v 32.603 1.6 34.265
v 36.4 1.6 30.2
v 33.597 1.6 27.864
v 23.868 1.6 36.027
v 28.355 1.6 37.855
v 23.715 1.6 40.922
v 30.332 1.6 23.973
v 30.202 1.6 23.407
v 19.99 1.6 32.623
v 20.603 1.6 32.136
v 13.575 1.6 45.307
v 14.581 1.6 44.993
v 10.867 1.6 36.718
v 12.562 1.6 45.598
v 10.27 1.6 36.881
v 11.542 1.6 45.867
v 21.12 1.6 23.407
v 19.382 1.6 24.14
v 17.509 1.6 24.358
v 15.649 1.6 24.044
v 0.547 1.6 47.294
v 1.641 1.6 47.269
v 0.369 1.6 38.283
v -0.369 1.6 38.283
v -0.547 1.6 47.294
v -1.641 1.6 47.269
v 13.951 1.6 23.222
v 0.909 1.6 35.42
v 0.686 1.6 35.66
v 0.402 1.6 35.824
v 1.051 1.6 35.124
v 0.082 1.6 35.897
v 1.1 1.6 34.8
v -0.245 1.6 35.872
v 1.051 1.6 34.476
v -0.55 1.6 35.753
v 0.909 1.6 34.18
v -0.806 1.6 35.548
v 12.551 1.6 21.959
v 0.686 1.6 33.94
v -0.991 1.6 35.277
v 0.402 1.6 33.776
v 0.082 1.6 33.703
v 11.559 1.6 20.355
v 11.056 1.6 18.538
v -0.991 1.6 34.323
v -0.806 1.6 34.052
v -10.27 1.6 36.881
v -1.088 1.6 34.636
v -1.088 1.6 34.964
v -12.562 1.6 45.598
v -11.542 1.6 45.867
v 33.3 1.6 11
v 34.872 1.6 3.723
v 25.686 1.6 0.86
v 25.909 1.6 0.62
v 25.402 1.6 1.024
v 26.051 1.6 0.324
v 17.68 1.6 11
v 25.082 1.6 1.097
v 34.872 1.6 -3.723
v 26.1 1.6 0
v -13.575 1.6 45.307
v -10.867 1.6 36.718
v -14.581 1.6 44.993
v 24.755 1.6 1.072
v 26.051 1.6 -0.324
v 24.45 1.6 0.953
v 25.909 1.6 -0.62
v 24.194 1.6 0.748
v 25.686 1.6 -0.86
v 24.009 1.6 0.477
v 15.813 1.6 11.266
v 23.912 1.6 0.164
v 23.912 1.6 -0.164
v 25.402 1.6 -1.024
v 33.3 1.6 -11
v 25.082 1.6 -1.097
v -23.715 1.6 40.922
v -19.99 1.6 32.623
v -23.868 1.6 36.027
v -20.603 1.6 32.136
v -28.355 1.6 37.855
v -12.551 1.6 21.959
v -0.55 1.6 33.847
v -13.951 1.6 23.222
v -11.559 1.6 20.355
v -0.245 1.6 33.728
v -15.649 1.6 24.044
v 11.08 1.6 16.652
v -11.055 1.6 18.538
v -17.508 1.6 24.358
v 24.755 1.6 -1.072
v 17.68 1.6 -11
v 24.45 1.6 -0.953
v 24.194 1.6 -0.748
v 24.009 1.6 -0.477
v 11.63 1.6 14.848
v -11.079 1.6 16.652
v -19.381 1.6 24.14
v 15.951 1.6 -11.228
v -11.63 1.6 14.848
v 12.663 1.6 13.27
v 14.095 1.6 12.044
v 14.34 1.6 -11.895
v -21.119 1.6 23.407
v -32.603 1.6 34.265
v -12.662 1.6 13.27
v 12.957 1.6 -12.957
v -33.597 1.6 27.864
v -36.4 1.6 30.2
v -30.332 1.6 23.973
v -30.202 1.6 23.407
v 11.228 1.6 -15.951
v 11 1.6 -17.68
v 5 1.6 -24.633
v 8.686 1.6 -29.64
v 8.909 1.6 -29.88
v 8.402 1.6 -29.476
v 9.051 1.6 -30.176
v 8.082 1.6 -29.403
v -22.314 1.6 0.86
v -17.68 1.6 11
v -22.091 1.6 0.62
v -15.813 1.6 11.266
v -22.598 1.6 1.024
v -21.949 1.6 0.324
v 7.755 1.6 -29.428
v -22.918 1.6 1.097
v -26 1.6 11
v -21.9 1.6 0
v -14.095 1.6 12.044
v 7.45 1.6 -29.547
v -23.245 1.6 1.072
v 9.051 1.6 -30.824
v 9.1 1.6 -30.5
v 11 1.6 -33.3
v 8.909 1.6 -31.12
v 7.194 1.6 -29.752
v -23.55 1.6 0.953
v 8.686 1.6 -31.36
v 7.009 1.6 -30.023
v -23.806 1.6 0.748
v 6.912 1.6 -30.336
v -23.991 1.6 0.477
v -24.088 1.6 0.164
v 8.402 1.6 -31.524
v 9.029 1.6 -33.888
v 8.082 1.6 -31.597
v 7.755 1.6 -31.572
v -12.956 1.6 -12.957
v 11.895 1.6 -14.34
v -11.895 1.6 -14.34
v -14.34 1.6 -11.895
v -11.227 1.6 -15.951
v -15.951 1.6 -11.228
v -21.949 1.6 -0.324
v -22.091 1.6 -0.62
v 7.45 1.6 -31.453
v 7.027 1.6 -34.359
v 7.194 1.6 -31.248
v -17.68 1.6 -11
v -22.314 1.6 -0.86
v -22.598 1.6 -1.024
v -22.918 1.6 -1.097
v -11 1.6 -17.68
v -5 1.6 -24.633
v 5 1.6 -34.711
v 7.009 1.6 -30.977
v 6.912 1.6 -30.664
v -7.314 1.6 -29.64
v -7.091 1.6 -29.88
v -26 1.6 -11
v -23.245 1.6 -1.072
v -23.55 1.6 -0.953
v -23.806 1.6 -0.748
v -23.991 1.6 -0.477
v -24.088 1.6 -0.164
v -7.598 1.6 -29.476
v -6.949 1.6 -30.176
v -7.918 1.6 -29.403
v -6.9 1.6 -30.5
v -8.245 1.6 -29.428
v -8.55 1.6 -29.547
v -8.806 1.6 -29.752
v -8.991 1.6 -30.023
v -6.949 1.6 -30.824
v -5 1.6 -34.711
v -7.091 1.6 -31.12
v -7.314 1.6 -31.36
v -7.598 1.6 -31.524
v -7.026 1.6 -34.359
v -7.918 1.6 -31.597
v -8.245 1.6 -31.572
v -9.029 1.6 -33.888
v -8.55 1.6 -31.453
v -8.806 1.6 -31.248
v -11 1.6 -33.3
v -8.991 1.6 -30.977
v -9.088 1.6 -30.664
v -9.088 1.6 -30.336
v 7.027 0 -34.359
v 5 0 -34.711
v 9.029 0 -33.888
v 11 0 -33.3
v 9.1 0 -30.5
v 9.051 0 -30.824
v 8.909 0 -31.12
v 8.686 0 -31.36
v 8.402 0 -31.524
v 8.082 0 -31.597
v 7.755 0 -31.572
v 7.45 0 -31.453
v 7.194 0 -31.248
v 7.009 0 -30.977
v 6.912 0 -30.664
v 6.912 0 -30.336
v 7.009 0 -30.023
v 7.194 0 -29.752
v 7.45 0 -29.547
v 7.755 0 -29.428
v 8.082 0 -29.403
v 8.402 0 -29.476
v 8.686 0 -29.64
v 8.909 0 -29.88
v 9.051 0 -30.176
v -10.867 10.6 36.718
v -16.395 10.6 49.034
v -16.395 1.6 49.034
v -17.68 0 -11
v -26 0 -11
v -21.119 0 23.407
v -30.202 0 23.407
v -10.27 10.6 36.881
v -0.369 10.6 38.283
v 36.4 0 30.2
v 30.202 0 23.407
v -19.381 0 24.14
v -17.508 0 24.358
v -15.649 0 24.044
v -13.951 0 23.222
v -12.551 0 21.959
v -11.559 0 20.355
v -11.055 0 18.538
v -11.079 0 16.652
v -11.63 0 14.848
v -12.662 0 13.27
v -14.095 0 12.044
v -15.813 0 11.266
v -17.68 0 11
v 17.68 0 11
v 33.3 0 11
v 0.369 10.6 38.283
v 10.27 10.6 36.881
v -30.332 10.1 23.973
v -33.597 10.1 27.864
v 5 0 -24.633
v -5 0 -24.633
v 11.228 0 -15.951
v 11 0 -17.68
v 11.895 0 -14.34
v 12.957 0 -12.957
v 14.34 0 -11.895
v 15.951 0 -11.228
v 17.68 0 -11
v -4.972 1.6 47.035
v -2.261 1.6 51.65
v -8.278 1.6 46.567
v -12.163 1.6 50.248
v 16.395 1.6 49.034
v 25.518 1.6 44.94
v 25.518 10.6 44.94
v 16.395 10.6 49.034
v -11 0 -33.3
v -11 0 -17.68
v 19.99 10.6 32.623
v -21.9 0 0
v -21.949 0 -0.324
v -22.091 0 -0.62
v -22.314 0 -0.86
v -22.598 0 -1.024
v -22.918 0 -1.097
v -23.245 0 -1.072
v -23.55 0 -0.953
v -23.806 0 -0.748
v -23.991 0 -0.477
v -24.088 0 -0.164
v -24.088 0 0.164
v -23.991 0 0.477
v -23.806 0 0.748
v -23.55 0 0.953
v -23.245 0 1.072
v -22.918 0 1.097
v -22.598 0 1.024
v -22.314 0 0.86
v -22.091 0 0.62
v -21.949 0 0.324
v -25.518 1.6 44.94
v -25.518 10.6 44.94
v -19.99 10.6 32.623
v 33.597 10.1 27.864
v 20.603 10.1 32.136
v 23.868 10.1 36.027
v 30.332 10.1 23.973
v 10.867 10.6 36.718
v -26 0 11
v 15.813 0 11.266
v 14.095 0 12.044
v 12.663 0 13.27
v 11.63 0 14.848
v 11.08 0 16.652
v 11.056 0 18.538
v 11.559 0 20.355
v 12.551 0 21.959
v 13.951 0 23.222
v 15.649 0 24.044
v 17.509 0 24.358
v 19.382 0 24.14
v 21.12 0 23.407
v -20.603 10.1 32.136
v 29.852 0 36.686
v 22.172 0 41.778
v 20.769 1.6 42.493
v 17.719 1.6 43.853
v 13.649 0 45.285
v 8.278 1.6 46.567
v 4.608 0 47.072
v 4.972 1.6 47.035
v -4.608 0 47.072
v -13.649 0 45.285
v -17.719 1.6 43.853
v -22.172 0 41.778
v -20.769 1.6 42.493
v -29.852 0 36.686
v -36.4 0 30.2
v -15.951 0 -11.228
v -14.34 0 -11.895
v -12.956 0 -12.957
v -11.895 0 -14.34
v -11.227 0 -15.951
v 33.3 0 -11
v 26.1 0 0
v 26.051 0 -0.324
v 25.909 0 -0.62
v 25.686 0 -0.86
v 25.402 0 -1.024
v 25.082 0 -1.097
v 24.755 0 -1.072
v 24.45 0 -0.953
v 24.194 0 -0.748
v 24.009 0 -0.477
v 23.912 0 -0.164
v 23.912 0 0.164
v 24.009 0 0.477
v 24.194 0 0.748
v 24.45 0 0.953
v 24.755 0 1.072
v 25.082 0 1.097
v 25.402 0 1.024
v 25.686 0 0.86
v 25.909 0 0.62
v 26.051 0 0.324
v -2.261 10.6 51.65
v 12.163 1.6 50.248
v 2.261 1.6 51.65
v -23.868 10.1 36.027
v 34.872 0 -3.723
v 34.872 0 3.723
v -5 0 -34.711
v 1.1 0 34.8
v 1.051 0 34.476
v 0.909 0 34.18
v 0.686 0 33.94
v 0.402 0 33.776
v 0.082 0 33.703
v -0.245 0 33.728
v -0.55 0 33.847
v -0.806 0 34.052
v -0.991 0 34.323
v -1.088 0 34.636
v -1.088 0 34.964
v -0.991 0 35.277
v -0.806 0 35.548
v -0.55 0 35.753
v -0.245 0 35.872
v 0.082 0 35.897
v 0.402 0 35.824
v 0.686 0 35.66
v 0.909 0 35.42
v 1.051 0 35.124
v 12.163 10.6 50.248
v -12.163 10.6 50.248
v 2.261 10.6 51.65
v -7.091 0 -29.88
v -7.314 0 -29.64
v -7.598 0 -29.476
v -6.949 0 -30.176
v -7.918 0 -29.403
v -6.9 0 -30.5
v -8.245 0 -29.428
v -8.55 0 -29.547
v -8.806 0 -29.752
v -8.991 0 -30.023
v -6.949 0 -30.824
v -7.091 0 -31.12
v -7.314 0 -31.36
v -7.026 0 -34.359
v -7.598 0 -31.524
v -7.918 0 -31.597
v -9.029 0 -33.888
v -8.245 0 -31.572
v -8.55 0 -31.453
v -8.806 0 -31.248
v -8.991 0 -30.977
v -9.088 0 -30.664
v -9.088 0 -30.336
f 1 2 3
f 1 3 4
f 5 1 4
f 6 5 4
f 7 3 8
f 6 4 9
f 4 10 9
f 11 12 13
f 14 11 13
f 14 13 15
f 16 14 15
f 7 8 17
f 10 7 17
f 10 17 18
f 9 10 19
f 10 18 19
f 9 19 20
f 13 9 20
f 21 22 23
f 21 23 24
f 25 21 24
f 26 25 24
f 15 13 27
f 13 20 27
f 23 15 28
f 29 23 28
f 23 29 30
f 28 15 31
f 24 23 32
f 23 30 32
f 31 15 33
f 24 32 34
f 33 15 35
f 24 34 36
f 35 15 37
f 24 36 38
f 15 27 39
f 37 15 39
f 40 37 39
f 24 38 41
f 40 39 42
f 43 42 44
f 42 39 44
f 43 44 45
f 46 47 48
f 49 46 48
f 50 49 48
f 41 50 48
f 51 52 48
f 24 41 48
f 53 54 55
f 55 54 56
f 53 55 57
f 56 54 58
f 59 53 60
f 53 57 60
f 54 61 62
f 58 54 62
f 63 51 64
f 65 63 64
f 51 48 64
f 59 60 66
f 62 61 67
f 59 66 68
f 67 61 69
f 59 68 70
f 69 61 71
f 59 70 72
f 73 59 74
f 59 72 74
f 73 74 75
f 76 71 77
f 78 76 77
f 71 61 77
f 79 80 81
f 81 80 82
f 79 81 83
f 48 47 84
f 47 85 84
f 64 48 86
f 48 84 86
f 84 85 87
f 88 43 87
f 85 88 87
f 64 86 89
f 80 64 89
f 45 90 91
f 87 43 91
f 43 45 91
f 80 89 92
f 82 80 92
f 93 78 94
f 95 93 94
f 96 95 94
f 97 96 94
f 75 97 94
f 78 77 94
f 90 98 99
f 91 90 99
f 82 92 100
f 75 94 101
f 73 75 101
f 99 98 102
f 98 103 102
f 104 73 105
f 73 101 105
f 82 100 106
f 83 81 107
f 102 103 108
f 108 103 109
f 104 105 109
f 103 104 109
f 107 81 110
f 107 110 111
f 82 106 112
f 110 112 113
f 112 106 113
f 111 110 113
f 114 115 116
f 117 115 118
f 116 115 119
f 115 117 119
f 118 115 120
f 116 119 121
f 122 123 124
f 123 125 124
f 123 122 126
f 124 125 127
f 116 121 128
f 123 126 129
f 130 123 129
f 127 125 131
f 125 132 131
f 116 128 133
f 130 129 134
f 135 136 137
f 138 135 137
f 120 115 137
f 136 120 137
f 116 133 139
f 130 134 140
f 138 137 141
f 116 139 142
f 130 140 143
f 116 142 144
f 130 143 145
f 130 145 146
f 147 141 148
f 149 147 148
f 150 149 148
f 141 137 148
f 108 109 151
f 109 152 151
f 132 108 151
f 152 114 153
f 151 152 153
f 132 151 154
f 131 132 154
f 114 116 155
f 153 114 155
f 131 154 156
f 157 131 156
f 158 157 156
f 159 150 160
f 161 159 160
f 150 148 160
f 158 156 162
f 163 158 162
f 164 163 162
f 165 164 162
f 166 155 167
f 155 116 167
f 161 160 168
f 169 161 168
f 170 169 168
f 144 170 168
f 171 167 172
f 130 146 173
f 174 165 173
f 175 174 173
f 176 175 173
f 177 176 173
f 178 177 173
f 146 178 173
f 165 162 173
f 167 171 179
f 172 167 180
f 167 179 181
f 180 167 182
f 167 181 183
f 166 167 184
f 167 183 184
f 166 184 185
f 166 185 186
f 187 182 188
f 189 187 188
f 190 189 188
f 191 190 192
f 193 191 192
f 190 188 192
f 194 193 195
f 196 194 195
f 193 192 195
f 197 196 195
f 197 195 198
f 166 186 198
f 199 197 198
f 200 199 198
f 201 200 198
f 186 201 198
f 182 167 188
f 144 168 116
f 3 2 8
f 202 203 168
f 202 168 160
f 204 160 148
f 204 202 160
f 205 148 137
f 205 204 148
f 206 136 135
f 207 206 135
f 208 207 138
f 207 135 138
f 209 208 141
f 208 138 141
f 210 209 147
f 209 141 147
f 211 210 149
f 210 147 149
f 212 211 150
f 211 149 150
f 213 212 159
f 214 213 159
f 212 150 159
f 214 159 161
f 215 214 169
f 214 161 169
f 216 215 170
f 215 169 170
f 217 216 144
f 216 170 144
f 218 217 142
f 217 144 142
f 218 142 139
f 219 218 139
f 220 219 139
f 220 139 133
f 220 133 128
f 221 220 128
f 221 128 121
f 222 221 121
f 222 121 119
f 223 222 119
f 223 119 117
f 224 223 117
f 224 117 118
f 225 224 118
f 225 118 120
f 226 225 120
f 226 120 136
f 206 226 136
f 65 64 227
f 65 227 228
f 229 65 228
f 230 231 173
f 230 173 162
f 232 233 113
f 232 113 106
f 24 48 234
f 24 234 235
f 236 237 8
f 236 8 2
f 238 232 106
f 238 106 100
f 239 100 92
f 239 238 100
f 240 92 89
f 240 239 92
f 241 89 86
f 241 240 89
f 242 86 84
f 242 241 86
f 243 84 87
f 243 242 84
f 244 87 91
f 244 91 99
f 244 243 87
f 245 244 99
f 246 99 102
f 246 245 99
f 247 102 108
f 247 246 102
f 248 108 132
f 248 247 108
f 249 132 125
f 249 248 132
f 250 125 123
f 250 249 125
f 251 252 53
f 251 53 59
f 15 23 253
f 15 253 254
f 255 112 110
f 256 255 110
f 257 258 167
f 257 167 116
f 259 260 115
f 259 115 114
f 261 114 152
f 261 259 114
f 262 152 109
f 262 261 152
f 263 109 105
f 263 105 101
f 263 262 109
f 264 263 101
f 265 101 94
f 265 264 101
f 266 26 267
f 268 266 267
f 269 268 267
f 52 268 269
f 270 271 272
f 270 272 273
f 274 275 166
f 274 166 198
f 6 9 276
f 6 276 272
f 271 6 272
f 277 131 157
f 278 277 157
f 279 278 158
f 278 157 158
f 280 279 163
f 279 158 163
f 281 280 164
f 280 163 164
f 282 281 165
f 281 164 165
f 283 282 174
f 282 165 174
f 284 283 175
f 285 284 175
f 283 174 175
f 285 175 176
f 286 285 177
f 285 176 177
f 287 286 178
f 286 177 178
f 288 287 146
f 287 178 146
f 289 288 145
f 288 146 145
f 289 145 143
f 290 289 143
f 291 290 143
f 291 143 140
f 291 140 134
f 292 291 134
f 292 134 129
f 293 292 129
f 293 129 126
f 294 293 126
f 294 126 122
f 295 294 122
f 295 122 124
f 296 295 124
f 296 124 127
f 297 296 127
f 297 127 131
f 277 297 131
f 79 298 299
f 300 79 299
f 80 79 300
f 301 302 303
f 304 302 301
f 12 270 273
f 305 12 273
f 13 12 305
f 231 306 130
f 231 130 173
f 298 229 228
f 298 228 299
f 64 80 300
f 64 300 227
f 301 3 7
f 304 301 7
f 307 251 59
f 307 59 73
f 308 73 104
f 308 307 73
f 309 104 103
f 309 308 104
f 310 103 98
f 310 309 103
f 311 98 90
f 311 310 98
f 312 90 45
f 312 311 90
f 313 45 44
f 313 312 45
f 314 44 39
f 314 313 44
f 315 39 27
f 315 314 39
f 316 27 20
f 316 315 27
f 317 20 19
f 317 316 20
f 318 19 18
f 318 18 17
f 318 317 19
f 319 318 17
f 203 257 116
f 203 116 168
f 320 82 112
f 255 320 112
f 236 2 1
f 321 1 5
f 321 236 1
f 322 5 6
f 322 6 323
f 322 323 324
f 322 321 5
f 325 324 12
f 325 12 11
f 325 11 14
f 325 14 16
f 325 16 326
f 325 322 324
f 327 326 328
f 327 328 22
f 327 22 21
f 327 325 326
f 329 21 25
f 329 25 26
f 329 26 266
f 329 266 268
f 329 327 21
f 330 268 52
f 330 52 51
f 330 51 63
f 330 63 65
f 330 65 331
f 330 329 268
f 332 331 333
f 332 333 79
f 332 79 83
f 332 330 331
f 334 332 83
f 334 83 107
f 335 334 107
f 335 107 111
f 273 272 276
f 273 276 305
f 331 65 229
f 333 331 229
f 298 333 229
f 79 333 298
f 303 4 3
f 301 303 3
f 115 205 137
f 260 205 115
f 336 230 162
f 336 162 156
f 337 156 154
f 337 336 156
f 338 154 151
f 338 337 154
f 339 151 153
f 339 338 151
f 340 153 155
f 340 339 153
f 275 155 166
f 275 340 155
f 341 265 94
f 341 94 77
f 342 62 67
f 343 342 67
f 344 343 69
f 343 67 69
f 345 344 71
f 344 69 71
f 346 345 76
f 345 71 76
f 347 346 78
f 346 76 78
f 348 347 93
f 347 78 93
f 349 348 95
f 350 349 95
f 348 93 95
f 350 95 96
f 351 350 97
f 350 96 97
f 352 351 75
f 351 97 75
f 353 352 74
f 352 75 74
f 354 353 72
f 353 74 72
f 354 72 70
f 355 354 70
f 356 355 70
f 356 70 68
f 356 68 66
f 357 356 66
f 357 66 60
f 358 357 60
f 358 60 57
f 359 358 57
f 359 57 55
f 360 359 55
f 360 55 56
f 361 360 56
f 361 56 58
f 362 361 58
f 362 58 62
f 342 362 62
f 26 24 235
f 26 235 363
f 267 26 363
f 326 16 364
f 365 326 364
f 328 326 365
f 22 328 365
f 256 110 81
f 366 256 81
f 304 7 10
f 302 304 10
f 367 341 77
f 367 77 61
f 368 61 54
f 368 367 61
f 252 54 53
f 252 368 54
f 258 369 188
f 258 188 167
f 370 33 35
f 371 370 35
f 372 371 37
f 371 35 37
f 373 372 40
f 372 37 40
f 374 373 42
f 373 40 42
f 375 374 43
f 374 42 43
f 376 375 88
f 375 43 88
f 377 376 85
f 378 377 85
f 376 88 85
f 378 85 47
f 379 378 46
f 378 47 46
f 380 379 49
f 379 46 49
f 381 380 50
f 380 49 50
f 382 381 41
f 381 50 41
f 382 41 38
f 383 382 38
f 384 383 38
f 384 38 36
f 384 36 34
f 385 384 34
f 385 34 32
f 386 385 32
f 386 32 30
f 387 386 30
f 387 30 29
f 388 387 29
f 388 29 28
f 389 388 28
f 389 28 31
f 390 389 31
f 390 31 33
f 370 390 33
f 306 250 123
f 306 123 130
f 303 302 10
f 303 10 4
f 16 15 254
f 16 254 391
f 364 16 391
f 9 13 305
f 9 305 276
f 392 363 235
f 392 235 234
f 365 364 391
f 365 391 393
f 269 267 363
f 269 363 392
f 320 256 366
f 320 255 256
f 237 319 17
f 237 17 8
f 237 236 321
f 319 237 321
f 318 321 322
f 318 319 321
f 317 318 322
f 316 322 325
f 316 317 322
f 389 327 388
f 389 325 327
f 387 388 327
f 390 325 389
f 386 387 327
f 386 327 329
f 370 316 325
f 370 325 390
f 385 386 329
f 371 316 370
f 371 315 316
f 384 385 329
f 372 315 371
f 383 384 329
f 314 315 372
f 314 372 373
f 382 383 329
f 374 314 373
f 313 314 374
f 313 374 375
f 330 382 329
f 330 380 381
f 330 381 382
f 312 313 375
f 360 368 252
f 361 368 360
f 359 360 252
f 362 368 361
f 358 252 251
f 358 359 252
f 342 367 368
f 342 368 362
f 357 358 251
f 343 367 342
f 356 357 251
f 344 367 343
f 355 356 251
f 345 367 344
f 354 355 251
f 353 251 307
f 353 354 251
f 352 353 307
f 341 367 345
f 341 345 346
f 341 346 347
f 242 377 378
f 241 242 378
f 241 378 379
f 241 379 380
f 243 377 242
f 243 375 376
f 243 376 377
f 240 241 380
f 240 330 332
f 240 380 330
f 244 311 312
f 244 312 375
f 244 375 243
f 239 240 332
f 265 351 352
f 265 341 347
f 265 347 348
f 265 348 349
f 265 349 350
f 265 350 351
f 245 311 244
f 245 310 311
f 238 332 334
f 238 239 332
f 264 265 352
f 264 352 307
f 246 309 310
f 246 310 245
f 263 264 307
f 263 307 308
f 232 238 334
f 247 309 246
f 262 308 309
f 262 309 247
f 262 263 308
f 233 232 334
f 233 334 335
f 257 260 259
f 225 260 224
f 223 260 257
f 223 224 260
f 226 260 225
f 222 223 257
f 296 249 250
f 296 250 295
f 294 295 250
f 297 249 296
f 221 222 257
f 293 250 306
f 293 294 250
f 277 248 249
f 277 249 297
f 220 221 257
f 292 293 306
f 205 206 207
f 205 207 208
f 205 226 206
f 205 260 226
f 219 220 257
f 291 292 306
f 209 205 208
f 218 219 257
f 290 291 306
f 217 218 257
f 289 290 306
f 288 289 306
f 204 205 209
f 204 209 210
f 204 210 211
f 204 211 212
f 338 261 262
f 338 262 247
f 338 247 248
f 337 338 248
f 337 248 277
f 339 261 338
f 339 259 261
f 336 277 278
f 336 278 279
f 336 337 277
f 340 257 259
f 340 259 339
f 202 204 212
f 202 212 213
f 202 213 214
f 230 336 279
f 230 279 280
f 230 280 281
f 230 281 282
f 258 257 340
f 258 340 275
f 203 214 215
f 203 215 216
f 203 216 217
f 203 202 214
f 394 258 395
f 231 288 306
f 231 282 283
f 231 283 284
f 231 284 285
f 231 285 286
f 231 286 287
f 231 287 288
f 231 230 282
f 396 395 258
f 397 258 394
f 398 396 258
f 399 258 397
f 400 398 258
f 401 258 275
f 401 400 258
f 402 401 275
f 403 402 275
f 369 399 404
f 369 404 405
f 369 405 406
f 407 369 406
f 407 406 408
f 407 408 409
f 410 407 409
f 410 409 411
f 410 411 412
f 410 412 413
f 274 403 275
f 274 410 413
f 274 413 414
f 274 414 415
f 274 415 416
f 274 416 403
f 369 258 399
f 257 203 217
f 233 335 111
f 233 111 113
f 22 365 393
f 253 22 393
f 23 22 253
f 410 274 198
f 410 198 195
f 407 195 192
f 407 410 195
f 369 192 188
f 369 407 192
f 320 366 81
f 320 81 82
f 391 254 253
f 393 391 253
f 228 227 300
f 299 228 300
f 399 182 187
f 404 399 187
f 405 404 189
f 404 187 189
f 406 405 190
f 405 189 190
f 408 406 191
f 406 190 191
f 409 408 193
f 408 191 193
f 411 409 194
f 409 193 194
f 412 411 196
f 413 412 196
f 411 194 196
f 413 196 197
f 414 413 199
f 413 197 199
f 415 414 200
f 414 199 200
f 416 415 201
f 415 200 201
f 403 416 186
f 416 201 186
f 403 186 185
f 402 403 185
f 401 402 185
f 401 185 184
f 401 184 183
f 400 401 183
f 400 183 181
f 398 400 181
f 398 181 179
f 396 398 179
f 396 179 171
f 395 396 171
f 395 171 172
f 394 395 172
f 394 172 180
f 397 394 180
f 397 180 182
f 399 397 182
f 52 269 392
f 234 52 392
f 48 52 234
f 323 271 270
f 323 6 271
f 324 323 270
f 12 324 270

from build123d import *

# Parameters (mm, degrees)
BOSS_EXTRUDE1_DEPTH = 1.6
BOSS_EXTRUDE2_DEPTH = 8.5
BOSS_EXTRUDE3_DEPTH = 9
SKETCH4_R           = 1.1
CUT_EXTRUDE1_DEPTH  = 2.6


with BuildPart() as part:
    # Sketch1 → Boss-Extrude1 (new body)
    with BuildSketch(Plane(origin=(0, 0, 0), x_dir=(1, 0, 0), z_dir=(0, 1, 0))):
        with BuildLine():
            Line((-10.999776277, 17.68), (-10.999776277, 33.3))
            ThreePointArc((-10.999776277, 33.3), (-8.030956433, 34.137791623), (-5, 34.711454567))
            Line((-5, 34.711454567), (-5, 24.633454567))
            Line((-5, 24.633454567), (5, 24.633454567))
            Line((5, 24.633454567), (5, 34.711454567))
            ThreePointArc((5, 34.711454567), (8.031185785, 34.137737667), (11.000223723, 33.299852195))
            Line((11.000223723, 33.299852195), (11.000223723, 17.68))
            ThreePointArc((11.000223723, 17.68), (12.956750425, 12.956526702), (17.680223723, 11))
            Line((17.680223723, 11), (33.300223723, 11))
            ThreePointArc((33.300223723, 11), (35.07, 0), (33.300223723, -11))
            Line((33.300223723, -11), (17.680223723, -11))
            ThreePointArc((17.680223723, -11), (11.24298933, -19.464492467), (21.119504048, -23.406582825))
            Line((21.119504048, -23.406582825), (30.202056601, -23.406582825))
            Line((30.202056601, -23.406582825), (36.4, -30.200102798))
            ThreePointArc((36.4, -30.200102798), (0, -47.297), (-36.4, -30.200102798))
            Line((-36.4, -30.200102798), (-30.202056601, -23.406582825))
            Line((-30.202056601, -23.406582825), (-21.119056601, -23.406582825))
            ThreePointArc((-21.119056601, -23.406582825), (-11.242541883, -19.464492467), (-17.679776277, -11))
            Line((-17.679776277, -11), (-25.999776277, -11))
            Line((-25.999776277, -11), (-25.999776277, 11))
            Line((-25.999776277, 11), (-17.679776277, 11))
            ThreePointArc((-17.679776277, 11), (-12.956302978, 12.956526702), (-10.999776277, 17.68))
        make_face()
    extrude(amount=BOSS_EXTRUDE1_DEPTH)

    # Sketch2 → Boss-Extrude2 (add)
    with BuildSketch(Plane(origin=(0, 1.6, 0), x_dir=(1, 0, 0), z_dir=(0, 1, 0))):
        Polygon((-33.597062742, -27.864051564), (-23.868298315, -36.027454207), (-20.602937258, -32.135948436), (-30.331701685, -23.972545793), align=None)
        Polygon((23.868298315, -36.027454207), (33.597062742, -27.864051564), (30.331701685, -23.972545793), (20.602937258, -32.135948436), align=None)
    extrude(amount=BOSS_EXTRUDE2_DEPTH)

    # Sketch3 → Boss-Extrude3 (add)
    with BuildSketch(Plane(origin=(0, 1.6, 0), x_dir=(1, 0, 0), z_dir=(0, 1, 0))):
        Polygon((-25.517948101, -44.939697826), (-19.990220336, -32.623276846), (-10.866945536, -36.717890005), (-16.394673301, -49.034310985), align=None)
        Polygon((-0.36916096, -38.28278004), (-2.261296496, -51.649523215), (-12.162587737, -50.247941336), (-10.2704522, -36.881198161), align=None)
        Polygon((2.261296496, -51.649523215), (0.36916096, -38.28278004), (10.2704522, -36.881198161), (12.162587737, -50.247941336), align=None)
        Polygon((16.394673301, -49.034310985), (10.866945536, -36.717890005), (19.990220336, -32.623276846), (25.517948101, -44.939697826), align=None)
    extrude(amount=BOSS_EXTRUDE3_DEPTH)

    # Sketch4 → Cut-Extrude1 (cut, through all)
    with BuildSketch(Plane(origin=(0, 1.6, 0), x_dir=(1, 0, 0), z_dir=(0, 1, 0))):
        with Locations((0, -34.8)):
            Circle(SKETCH4_R)
        with Locations((25, 0)):
            Circle(SKETCH4_R)
        with Locations((-23, 0)):
            Circle(SKETCH4_R)
        with Locations((-8, 30.5)):
            Circle(SKETCH4_R)
        with Locations((8, 30.5)):
            Circle(SKETCH4_R)
    extrude(amount=-CUT_EXTRUDE1_DEPTH, mode=Mode.SUBTRACT)


solid = part.part
